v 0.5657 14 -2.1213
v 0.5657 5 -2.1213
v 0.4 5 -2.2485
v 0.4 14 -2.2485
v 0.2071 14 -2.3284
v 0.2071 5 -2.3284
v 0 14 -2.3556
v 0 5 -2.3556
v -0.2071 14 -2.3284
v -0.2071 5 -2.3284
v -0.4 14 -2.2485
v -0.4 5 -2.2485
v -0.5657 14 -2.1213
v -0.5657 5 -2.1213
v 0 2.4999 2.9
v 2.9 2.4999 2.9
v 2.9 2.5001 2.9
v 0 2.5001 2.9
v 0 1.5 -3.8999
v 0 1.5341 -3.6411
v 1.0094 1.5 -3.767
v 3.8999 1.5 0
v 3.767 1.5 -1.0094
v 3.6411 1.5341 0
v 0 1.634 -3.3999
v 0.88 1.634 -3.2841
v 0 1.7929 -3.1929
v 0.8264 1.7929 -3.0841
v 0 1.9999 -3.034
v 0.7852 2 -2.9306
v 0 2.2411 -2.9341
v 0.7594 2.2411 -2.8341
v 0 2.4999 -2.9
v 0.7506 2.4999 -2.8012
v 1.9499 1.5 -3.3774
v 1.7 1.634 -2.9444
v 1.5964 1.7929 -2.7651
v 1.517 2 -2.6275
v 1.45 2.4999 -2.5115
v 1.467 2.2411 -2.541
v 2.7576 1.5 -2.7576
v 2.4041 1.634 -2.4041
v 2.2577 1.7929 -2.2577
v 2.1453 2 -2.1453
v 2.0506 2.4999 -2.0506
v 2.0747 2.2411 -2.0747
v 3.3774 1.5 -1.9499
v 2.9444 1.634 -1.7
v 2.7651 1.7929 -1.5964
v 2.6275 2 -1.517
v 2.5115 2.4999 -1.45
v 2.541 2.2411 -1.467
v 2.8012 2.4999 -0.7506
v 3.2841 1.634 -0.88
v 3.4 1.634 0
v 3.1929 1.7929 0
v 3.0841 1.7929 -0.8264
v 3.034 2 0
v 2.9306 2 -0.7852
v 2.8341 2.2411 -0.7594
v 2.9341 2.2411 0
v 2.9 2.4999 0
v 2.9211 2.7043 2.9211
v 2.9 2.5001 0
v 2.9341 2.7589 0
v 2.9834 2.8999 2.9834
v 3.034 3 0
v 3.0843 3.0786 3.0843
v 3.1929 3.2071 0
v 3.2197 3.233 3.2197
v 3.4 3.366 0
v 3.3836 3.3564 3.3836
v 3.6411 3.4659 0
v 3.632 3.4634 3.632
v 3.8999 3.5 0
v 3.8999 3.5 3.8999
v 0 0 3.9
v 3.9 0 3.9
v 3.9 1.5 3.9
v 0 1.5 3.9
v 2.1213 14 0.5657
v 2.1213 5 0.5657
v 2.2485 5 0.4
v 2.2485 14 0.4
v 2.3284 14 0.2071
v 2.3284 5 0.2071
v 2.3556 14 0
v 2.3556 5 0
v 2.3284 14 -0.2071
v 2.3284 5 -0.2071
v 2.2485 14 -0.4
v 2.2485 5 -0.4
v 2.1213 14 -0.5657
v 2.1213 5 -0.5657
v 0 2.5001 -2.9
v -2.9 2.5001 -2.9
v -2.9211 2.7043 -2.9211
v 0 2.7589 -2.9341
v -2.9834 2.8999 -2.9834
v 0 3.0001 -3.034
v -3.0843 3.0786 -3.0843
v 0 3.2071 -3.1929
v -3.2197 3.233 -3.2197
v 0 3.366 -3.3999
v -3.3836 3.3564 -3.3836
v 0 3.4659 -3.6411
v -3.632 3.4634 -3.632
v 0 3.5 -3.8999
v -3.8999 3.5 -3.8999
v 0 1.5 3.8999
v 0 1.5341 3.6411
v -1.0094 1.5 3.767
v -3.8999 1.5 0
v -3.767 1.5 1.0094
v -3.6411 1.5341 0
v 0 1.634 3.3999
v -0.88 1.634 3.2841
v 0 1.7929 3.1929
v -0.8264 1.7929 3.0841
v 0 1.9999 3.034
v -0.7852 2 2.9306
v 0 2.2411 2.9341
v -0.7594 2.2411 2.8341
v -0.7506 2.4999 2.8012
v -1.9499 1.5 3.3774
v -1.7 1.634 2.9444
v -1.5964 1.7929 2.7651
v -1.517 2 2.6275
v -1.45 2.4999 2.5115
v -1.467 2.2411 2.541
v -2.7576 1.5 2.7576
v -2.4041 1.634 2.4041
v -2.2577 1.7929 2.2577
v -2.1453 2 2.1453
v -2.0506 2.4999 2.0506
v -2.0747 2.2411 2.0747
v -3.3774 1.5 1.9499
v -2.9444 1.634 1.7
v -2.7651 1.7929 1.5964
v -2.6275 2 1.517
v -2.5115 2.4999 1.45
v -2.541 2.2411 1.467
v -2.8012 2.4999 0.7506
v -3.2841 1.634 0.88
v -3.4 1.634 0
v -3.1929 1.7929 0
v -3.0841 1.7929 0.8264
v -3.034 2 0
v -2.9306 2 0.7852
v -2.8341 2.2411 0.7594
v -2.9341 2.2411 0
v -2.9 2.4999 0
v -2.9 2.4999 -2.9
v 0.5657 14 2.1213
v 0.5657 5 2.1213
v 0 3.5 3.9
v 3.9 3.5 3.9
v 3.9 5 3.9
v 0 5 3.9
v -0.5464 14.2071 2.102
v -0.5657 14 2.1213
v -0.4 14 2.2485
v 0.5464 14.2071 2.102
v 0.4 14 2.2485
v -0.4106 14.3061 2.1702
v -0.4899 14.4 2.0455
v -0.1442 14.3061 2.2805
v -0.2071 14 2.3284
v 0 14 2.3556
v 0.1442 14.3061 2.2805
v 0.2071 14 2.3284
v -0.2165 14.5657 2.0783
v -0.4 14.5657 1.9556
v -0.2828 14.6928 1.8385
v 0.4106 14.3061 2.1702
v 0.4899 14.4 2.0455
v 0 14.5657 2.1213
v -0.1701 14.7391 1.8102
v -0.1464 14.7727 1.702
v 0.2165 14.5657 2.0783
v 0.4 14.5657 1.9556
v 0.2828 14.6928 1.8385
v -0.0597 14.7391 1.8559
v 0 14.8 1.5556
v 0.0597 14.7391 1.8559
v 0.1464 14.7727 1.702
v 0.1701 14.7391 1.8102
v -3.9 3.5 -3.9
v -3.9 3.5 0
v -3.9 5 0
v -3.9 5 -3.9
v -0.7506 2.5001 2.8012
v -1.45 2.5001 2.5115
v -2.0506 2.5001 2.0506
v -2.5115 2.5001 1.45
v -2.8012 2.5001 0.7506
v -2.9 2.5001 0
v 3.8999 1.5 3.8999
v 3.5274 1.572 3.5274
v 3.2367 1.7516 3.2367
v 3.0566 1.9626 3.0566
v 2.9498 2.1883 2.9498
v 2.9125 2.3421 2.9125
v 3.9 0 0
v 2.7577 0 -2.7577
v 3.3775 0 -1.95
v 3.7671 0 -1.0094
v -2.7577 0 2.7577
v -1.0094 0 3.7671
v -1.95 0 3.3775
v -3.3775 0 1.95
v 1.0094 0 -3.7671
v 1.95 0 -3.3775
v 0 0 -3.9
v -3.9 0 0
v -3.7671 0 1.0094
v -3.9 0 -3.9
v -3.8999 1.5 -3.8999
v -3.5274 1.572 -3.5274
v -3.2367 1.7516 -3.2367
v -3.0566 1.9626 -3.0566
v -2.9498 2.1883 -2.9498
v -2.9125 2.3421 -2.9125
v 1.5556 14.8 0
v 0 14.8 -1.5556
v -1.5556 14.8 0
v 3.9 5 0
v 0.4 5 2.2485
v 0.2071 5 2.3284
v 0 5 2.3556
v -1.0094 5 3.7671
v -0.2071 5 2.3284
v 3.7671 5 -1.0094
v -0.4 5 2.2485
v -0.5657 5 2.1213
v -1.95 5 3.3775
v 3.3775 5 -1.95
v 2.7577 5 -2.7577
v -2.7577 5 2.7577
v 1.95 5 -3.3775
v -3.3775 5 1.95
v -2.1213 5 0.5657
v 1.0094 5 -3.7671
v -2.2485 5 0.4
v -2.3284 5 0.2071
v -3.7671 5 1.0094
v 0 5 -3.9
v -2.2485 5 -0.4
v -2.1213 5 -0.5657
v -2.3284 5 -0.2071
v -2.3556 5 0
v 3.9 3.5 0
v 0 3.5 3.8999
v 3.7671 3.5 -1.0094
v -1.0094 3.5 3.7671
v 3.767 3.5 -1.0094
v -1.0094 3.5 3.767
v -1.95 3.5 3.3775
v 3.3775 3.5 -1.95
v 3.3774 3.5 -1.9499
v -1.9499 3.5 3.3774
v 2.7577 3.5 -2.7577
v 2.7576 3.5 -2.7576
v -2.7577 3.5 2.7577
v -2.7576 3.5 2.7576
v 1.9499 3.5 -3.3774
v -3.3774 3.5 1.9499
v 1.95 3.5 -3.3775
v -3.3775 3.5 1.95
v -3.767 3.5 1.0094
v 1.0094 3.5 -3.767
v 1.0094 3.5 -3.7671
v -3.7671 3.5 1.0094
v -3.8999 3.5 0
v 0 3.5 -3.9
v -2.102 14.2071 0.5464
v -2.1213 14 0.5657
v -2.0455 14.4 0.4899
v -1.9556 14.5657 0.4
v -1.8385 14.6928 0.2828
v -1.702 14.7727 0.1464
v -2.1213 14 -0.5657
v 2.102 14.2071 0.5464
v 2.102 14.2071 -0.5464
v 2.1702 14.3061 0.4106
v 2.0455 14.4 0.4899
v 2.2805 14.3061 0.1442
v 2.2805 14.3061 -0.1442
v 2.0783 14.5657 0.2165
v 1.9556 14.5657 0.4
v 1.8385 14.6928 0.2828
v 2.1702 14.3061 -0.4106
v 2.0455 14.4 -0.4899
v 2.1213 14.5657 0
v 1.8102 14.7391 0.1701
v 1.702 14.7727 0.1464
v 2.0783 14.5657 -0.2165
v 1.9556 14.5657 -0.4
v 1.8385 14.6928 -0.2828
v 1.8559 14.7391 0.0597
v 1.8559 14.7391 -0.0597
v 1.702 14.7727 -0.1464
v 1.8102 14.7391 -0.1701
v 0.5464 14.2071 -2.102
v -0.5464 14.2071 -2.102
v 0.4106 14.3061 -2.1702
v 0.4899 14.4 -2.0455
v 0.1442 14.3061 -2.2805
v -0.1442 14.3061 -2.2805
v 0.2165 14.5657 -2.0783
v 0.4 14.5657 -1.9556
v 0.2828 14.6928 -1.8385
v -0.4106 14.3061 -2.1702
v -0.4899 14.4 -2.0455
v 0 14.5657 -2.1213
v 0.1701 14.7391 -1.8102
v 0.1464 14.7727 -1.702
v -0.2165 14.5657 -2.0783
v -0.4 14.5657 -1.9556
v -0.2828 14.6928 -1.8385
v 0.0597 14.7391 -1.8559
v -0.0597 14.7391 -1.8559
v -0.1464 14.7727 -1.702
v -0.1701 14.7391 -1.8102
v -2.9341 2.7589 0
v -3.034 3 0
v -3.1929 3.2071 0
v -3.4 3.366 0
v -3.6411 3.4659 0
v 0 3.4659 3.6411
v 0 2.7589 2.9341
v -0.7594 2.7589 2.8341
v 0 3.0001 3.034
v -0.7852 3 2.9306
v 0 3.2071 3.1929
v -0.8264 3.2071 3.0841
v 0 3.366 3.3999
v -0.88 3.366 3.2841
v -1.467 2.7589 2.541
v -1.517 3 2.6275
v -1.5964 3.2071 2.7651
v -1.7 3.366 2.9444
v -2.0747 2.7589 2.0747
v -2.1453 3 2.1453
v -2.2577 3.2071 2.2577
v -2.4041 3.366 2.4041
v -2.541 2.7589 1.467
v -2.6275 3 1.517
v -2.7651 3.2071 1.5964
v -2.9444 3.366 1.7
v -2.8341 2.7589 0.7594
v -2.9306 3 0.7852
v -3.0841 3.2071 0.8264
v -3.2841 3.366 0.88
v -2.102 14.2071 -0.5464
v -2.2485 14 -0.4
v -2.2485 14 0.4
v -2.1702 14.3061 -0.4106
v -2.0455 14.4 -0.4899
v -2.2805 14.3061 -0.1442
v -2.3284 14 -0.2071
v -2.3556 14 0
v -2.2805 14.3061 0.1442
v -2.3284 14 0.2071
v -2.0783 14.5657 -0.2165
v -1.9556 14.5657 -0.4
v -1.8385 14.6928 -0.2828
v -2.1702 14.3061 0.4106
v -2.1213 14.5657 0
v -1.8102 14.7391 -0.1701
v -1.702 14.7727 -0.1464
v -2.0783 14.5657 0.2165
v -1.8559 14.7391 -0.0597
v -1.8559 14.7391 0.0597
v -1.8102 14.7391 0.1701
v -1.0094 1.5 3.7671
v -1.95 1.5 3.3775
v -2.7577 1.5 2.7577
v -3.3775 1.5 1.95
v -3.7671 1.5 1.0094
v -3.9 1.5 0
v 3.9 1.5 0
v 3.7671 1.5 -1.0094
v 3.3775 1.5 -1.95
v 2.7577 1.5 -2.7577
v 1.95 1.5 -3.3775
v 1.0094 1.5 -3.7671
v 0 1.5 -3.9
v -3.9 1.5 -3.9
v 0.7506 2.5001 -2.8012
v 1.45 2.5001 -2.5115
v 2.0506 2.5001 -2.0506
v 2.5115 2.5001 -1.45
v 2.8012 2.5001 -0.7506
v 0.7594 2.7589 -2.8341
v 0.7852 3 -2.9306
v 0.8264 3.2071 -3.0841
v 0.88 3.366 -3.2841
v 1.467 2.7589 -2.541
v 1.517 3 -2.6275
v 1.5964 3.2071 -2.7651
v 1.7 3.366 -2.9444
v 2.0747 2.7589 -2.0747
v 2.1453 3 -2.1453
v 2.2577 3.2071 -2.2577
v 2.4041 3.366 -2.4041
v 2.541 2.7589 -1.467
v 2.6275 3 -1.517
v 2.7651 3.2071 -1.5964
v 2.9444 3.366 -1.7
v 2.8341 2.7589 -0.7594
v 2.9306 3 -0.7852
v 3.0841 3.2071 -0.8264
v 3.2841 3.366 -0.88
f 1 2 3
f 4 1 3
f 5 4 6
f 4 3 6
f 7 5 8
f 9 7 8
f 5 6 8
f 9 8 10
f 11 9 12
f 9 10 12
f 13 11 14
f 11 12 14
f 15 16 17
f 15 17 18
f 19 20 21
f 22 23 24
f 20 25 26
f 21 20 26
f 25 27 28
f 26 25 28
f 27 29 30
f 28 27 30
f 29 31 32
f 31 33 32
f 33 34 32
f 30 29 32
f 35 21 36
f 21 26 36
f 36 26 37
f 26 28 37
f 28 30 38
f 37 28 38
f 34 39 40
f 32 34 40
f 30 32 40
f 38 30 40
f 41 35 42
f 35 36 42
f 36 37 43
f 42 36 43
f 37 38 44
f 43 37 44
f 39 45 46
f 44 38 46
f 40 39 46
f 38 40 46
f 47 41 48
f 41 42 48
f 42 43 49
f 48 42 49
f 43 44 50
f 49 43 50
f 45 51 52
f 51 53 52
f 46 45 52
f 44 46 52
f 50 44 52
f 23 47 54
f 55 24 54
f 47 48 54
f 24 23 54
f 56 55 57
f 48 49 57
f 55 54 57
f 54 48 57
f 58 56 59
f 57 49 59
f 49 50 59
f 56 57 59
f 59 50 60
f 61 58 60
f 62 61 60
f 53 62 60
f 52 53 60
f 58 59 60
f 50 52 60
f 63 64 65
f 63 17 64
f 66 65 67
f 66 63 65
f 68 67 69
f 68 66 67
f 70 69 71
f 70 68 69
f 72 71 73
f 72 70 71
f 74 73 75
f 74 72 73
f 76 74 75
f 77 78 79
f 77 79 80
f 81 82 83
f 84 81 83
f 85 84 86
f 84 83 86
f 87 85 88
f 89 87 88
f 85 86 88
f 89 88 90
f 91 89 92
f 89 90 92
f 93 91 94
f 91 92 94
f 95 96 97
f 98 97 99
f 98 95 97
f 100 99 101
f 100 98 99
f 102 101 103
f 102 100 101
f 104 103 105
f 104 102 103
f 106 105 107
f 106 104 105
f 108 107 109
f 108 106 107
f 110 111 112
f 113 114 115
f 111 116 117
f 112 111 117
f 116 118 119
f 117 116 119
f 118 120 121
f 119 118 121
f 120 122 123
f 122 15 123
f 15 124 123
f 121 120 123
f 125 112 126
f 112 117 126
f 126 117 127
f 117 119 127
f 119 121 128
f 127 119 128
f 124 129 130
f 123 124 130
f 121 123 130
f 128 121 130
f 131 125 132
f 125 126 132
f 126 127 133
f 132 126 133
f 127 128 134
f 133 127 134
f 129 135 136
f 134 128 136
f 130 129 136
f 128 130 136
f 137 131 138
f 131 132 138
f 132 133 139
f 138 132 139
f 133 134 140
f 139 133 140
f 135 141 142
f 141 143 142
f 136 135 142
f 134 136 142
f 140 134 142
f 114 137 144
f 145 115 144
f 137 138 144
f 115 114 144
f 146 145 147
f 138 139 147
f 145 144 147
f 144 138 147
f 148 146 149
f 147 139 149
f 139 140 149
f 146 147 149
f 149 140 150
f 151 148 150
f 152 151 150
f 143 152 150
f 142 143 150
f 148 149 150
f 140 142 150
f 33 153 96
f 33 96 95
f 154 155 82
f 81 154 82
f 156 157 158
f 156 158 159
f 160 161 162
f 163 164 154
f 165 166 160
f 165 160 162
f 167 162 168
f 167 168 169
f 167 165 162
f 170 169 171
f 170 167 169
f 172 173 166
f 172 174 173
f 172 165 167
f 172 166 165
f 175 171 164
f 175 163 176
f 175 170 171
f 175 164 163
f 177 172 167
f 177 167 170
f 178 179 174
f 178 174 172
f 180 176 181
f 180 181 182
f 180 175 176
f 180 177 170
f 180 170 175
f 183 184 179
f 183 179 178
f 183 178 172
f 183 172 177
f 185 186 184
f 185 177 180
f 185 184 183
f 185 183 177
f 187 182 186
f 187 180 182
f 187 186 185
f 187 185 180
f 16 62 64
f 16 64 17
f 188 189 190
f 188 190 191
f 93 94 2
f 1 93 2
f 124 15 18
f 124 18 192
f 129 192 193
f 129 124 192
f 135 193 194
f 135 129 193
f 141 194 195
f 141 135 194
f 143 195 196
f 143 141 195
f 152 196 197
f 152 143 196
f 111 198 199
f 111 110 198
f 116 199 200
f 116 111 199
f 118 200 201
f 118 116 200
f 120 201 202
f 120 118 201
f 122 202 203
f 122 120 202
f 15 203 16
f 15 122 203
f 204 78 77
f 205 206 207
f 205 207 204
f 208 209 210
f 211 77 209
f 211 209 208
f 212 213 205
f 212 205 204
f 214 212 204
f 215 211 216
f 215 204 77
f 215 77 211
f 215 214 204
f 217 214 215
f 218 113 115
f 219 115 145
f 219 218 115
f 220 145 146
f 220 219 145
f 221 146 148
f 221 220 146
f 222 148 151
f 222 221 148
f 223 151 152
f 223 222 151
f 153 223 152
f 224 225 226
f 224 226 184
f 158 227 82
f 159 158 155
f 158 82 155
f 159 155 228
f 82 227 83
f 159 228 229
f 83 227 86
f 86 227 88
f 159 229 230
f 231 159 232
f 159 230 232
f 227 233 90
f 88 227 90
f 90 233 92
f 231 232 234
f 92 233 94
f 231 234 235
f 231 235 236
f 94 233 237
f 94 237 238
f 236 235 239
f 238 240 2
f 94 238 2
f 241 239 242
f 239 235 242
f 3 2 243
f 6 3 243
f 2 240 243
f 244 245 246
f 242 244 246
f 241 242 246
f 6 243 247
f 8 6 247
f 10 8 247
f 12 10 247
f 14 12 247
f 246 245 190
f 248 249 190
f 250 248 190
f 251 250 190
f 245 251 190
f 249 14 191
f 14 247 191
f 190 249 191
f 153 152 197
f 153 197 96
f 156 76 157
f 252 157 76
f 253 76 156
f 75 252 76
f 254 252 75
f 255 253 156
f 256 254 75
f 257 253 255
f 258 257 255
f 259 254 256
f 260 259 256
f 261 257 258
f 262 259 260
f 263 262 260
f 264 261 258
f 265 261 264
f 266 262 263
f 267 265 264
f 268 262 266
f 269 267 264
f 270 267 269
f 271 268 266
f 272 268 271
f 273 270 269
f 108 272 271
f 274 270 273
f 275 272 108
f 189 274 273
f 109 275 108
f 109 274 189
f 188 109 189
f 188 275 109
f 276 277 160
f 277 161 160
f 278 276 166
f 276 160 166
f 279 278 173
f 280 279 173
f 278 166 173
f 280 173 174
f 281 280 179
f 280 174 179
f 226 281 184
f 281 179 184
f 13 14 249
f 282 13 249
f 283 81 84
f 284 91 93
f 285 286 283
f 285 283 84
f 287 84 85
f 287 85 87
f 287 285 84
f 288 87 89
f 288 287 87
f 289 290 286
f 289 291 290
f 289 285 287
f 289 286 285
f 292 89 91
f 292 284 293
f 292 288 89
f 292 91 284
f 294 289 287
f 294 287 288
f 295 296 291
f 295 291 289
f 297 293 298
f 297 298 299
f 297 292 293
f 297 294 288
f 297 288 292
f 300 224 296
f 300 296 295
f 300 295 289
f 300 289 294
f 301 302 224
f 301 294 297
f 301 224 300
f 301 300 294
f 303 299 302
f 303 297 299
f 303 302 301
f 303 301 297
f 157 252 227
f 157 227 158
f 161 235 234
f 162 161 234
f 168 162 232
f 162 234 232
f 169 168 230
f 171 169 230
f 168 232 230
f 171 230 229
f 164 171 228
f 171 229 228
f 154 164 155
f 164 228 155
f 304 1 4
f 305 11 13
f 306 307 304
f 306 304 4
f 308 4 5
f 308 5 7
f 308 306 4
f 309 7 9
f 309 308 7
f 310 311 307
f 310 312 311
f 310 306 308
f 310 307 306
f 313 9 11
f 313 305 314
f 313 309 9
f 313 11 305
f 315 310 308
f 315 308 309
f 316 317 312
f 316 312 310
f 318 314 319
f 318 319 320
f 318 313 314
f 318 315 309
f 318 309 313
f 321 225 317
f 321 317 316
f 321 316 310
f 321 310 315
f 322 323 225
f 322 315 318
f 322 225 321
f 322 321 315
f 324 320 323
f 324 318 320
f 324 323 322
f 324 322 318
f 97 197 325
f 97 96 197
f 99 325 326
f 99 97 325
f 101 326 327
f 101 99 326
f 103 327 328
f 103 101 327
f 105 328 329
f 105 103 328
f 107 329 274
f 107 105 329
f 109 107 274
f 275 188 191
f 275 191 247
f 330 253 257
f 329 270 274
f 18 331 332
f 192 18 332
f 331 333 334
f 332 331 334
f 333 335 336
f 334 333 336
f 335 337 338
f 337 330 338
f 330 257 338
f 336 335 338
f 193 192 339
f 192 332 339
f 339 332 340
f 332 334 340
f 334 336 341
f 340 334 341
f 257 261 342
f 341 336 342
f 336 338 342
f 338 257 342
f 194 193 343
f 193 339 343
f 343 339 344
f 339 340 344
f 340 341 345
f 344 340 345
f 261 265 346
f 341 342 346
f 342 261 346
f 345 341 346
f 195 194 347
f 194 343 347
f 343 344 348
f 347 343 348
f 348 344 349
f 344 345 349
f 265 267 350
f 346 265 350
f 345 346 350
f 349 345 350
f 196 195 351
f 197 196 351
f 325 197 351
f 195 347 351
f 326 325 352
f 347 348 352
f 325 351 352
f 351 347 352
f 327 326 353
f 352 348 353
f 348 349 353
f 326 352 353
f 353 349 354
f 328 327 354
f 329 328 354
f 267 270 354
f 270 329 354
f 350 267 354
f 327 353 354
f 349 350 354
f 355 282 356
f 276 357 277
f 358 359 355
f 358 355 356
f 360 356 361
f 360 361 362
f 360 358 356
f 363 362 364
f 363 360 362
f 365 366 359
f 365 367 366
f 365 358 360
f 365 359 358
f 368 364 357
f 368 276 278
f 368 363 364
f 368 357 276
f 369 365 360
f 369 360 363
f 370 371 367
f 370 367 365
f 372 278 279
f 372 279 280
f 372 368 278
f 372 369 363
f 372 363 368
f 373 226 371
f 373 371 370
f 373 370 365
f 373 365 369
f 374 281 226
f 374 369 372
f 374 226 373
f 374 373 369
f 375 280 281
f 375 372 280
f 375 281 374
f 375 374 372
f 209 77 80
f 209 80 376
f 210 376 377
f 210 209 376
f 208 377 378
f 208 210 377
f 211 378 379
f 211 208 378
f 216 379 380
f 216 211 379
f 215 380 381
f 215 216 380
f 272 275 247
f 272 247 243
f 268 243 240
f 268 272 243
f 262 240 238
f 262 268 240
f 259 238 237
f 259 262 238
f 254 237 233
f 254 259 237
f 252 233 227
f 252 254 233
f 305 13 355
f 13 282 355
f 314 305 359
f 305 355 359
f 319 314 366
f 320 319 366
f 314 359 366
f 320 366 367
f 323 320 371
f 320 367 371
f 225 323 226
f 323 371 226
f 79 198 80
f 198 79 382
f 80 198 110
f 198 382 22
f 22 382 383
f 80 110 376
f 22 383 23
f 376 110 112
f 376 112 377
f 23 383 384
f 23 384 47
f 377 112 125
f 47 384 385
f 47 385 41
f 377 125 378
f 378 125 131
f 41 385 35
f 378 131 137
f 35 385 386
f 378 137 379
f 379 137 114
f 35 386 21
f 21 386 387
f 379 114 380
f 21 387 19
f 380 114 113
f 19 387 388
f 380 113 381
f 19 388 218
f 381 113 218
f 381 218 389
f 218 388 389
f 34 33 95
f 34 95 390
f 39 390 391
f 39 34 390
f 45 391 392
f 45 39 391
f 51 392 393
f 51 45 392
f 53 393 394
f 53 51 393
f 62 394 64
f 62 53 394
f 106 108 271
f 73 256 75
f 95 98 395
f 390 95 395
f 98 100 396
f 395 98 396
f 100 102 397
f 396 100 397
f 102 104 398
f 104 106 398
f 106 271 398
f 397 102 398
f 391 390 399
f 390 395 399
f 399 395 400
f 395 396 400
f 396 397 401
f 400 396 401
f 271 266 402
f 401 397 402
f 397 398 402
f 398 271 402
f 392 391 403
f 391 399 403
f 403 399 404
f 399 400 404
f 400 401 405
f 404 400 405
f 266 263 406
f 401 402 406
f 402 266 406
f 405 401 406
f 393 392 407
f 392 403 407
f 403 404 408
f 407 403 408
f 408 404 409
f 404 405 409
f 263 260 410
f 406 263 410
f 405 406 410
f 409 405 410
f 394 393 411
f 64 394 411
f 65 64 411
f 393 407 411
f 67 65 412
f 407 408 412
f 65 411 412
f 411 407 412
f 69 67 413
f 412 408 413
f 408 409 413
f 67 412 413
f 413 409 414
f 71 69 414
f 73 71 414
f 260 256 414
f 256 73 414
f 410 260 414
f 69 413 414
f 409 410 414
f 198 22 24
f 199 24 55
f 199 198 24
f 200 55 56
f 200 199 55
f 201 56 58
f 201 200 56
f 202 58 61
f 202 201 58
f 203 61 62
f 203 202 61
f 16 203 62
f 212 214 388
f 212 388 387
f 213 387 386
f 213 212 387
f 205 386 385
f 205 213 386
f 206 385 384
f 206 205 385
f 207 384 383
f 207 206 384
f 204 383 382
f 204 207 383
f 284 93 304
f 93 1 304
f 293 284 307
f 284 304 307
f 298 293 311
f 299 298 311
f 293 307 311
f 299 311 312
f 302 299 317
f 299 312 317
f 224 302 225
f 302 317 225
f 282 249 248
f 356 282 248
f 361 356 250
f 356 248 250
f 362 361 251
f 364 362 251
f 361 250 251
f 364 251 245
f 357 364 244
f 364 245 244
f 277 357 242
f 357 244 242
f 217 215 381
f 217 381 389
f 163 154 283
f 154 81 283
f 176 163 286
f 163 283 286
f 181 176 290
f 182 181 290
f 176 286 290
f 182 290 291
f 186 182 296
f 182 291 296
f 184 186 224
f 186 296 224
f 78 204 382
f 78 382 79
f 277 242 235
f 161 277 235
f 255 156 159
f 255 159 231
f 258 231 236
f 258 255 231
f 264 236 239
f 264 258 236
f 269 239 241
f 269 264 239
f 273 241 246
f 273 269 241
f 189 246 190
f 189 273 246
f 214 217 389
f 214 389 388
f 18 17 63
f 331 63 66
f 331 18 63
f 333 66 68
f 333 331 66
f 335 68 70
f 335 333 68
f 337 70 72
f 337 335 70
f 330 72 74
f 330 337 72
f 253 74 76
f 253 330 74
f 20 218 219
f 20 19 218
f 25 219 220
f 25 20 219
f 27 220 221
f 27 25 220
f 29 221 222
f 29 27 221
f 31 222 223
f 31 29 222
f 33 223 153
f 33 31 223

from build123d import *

# Parameters (mm, degrees)
BOSS_EXTRUDE1_DEPTH     = 5
BOSS_EXTRUDE2_DEPTH     = 9.8
CUT_EXTRUDE2_DEPTH      = 1
CUT_EXTRUDE2_DEPTH_BACK = 1
FILLET1_R               = 1
FILLET3_R               = 0.8


with BuildPart() as part:
    # Sketch1 → Boss-Extrude1 (new body)
    with BuildSketch(Plane(origin=(0, 0, 0), x_dir=(1, 0, 0), z_dir=(0, 1, 0))):
        with BuildLine():
            Line((-3.9, 3.9), (0, 3.9))
            ThreePointArc((0, 3.9), (2.757716447, 2.757716447), (3.9, 0))
            Line((3.9, 0), (3.9, -3.9))
            Line((3.9, -3.9), (0, -3.9))
            ThreePointArc((0, -3.9), (-2.757716447, -2.757716447), (-3.9, 0))
            Line((-3.9, 0), (-3.9, 3.9))
        make_face()
    extrude(amount=BOSS_EXTRUDE1_DEPTH)

    # Sketch2 → Boss-Extrude2 (add)
    with BuildSketch(Plane(origin=(0, 5, 0), x_dir=(1, 0, 0), z_dir=(0, 1, 0))):
        with BuildLine():
            Line((-0.565685425, 2.121320344), (-2.121320344, 0.565685425))
            ThreePointArc((-2.121320344, 0.565685425), (-2.355634919, 0), (-2.121320344, -0.565685425))
            Line((-2.121320344, -0.565685425), (-0.565685425, -2.121320344))
            ThreePointArc((-0.565685425, -2.121320344), (0, -2.355634919), (0.565685425, -2.121320344))
            Line((0.565685425, -2.121320344), (2.121320344, -0.565685425))
            ThreePointArc((2.121320344, -0.565685425), (2.355634919, 0), (2.121320344, 0.565685425))
            Line((2.121320344, 0.565685425), (0.565685425, 2.121320344))
            ThreePointArc((0.565685425, 2.121320344), (0, 2.355634919), (-0.565685425, 2.121320344))
        make_face()
    extrude(amount=BOSS_EXTRUDE2_DEPTH)

    # Sketch3 → Cut-Extrude2 (cut, two sides: drawn at the far end of the back side and taken through both)
    with BuildSketch(Plane(origin=(0, 2.5, 0), x_dir=(1, 0, 0), z_dir=(0, 1, 0)).offset(-CUT_EXTRUDE2_DEPTH_BACK)):
        with BuildLine():
            Line((-3.9, 0), (-3.9, 3.9))
            Line((-3.9, 3.9), (0, 3.9))
            ThreePointArc((0, 3.9), (2.757716447, 2.757716447), (3.9, 0))
            Line((3.9, 0), (3.9, -3.9))
            Line((3.9, -3.9), (0, -3.9))
            ThreePointArc((0, -3.9), (-2.757716447, -2.757716447), (-3.9, 0))
        make_face()
        with BuildLine():
            Line((-2.9, 0), (-2.9, 2.9))
            Line((-2.9, 2.9), (0, 2.9))
            ThreePointArc((0, 2.9), (2.050609665, 2.050609665), (2.9, 0))
            Line((2.9, 0), (2.9, -2.9))
            Line((2.9, -2.9), (0, -2.9))
            ThreePointArc((0, -2.9), (-2.050609665, -2.050609665), (-2.9, 0))
        make_face(mode=Mode.SUBTRACT)
    extrude(amount=CUT_EXTRUDE2_DEPTH + CUT_EXTRUDE2_DEPTH_BACK, mode=Mode.SUBTRACT)

    # Fillet1
    fillet1_edges = [part.edges().sort_by_distance(p)[0] for p in [
        (2.9, 3.5, 1.45),
        (2.050609665, 3.5, -2.050609665),
        (1.45, 3.5, 2.9),
        (-2.050609665, 3.5, 2.050609665),
        (2.9, 1.5, 1.45),
        (2.050609665, 1.5, -2.050609665),
        (-2.9, 1.5, -1.45),
        (1.45, 1.5, 2.9),
        (-1.45, 3.5, -2.9),
        (-2.9, 3.5, -1.45),
        (-1.45, 1.5, -2.9),
        (-2.050609665, 1.5, 2.050609665),
    ]]
    fillet(fillet1_edges, radius=FILLET1_R - 0.0001)  # a hair under: the kernel refuses the full size

    # Fillet3
    fillet3_edges = [part.edges().sort_by_distance(p)[0] for p in [
        (0, 14.8, 2.355634919),
        (1.343502884, 14.8, 1.343502884),
        (2.355634919, 14.8, 0),
        (1.343502884, 14.8, -1.343502884),
        (0, 14.8, -2.355634919),
        (-1.343502884, 14.8, -1.343502884),
        (-2.355634919, 14.8, 0),
        (-1.343502884, 14.8, 1.343502884),
    ]]
    fillet(fillet3_edges, radius=FILLET3_R)


solid = part.part
